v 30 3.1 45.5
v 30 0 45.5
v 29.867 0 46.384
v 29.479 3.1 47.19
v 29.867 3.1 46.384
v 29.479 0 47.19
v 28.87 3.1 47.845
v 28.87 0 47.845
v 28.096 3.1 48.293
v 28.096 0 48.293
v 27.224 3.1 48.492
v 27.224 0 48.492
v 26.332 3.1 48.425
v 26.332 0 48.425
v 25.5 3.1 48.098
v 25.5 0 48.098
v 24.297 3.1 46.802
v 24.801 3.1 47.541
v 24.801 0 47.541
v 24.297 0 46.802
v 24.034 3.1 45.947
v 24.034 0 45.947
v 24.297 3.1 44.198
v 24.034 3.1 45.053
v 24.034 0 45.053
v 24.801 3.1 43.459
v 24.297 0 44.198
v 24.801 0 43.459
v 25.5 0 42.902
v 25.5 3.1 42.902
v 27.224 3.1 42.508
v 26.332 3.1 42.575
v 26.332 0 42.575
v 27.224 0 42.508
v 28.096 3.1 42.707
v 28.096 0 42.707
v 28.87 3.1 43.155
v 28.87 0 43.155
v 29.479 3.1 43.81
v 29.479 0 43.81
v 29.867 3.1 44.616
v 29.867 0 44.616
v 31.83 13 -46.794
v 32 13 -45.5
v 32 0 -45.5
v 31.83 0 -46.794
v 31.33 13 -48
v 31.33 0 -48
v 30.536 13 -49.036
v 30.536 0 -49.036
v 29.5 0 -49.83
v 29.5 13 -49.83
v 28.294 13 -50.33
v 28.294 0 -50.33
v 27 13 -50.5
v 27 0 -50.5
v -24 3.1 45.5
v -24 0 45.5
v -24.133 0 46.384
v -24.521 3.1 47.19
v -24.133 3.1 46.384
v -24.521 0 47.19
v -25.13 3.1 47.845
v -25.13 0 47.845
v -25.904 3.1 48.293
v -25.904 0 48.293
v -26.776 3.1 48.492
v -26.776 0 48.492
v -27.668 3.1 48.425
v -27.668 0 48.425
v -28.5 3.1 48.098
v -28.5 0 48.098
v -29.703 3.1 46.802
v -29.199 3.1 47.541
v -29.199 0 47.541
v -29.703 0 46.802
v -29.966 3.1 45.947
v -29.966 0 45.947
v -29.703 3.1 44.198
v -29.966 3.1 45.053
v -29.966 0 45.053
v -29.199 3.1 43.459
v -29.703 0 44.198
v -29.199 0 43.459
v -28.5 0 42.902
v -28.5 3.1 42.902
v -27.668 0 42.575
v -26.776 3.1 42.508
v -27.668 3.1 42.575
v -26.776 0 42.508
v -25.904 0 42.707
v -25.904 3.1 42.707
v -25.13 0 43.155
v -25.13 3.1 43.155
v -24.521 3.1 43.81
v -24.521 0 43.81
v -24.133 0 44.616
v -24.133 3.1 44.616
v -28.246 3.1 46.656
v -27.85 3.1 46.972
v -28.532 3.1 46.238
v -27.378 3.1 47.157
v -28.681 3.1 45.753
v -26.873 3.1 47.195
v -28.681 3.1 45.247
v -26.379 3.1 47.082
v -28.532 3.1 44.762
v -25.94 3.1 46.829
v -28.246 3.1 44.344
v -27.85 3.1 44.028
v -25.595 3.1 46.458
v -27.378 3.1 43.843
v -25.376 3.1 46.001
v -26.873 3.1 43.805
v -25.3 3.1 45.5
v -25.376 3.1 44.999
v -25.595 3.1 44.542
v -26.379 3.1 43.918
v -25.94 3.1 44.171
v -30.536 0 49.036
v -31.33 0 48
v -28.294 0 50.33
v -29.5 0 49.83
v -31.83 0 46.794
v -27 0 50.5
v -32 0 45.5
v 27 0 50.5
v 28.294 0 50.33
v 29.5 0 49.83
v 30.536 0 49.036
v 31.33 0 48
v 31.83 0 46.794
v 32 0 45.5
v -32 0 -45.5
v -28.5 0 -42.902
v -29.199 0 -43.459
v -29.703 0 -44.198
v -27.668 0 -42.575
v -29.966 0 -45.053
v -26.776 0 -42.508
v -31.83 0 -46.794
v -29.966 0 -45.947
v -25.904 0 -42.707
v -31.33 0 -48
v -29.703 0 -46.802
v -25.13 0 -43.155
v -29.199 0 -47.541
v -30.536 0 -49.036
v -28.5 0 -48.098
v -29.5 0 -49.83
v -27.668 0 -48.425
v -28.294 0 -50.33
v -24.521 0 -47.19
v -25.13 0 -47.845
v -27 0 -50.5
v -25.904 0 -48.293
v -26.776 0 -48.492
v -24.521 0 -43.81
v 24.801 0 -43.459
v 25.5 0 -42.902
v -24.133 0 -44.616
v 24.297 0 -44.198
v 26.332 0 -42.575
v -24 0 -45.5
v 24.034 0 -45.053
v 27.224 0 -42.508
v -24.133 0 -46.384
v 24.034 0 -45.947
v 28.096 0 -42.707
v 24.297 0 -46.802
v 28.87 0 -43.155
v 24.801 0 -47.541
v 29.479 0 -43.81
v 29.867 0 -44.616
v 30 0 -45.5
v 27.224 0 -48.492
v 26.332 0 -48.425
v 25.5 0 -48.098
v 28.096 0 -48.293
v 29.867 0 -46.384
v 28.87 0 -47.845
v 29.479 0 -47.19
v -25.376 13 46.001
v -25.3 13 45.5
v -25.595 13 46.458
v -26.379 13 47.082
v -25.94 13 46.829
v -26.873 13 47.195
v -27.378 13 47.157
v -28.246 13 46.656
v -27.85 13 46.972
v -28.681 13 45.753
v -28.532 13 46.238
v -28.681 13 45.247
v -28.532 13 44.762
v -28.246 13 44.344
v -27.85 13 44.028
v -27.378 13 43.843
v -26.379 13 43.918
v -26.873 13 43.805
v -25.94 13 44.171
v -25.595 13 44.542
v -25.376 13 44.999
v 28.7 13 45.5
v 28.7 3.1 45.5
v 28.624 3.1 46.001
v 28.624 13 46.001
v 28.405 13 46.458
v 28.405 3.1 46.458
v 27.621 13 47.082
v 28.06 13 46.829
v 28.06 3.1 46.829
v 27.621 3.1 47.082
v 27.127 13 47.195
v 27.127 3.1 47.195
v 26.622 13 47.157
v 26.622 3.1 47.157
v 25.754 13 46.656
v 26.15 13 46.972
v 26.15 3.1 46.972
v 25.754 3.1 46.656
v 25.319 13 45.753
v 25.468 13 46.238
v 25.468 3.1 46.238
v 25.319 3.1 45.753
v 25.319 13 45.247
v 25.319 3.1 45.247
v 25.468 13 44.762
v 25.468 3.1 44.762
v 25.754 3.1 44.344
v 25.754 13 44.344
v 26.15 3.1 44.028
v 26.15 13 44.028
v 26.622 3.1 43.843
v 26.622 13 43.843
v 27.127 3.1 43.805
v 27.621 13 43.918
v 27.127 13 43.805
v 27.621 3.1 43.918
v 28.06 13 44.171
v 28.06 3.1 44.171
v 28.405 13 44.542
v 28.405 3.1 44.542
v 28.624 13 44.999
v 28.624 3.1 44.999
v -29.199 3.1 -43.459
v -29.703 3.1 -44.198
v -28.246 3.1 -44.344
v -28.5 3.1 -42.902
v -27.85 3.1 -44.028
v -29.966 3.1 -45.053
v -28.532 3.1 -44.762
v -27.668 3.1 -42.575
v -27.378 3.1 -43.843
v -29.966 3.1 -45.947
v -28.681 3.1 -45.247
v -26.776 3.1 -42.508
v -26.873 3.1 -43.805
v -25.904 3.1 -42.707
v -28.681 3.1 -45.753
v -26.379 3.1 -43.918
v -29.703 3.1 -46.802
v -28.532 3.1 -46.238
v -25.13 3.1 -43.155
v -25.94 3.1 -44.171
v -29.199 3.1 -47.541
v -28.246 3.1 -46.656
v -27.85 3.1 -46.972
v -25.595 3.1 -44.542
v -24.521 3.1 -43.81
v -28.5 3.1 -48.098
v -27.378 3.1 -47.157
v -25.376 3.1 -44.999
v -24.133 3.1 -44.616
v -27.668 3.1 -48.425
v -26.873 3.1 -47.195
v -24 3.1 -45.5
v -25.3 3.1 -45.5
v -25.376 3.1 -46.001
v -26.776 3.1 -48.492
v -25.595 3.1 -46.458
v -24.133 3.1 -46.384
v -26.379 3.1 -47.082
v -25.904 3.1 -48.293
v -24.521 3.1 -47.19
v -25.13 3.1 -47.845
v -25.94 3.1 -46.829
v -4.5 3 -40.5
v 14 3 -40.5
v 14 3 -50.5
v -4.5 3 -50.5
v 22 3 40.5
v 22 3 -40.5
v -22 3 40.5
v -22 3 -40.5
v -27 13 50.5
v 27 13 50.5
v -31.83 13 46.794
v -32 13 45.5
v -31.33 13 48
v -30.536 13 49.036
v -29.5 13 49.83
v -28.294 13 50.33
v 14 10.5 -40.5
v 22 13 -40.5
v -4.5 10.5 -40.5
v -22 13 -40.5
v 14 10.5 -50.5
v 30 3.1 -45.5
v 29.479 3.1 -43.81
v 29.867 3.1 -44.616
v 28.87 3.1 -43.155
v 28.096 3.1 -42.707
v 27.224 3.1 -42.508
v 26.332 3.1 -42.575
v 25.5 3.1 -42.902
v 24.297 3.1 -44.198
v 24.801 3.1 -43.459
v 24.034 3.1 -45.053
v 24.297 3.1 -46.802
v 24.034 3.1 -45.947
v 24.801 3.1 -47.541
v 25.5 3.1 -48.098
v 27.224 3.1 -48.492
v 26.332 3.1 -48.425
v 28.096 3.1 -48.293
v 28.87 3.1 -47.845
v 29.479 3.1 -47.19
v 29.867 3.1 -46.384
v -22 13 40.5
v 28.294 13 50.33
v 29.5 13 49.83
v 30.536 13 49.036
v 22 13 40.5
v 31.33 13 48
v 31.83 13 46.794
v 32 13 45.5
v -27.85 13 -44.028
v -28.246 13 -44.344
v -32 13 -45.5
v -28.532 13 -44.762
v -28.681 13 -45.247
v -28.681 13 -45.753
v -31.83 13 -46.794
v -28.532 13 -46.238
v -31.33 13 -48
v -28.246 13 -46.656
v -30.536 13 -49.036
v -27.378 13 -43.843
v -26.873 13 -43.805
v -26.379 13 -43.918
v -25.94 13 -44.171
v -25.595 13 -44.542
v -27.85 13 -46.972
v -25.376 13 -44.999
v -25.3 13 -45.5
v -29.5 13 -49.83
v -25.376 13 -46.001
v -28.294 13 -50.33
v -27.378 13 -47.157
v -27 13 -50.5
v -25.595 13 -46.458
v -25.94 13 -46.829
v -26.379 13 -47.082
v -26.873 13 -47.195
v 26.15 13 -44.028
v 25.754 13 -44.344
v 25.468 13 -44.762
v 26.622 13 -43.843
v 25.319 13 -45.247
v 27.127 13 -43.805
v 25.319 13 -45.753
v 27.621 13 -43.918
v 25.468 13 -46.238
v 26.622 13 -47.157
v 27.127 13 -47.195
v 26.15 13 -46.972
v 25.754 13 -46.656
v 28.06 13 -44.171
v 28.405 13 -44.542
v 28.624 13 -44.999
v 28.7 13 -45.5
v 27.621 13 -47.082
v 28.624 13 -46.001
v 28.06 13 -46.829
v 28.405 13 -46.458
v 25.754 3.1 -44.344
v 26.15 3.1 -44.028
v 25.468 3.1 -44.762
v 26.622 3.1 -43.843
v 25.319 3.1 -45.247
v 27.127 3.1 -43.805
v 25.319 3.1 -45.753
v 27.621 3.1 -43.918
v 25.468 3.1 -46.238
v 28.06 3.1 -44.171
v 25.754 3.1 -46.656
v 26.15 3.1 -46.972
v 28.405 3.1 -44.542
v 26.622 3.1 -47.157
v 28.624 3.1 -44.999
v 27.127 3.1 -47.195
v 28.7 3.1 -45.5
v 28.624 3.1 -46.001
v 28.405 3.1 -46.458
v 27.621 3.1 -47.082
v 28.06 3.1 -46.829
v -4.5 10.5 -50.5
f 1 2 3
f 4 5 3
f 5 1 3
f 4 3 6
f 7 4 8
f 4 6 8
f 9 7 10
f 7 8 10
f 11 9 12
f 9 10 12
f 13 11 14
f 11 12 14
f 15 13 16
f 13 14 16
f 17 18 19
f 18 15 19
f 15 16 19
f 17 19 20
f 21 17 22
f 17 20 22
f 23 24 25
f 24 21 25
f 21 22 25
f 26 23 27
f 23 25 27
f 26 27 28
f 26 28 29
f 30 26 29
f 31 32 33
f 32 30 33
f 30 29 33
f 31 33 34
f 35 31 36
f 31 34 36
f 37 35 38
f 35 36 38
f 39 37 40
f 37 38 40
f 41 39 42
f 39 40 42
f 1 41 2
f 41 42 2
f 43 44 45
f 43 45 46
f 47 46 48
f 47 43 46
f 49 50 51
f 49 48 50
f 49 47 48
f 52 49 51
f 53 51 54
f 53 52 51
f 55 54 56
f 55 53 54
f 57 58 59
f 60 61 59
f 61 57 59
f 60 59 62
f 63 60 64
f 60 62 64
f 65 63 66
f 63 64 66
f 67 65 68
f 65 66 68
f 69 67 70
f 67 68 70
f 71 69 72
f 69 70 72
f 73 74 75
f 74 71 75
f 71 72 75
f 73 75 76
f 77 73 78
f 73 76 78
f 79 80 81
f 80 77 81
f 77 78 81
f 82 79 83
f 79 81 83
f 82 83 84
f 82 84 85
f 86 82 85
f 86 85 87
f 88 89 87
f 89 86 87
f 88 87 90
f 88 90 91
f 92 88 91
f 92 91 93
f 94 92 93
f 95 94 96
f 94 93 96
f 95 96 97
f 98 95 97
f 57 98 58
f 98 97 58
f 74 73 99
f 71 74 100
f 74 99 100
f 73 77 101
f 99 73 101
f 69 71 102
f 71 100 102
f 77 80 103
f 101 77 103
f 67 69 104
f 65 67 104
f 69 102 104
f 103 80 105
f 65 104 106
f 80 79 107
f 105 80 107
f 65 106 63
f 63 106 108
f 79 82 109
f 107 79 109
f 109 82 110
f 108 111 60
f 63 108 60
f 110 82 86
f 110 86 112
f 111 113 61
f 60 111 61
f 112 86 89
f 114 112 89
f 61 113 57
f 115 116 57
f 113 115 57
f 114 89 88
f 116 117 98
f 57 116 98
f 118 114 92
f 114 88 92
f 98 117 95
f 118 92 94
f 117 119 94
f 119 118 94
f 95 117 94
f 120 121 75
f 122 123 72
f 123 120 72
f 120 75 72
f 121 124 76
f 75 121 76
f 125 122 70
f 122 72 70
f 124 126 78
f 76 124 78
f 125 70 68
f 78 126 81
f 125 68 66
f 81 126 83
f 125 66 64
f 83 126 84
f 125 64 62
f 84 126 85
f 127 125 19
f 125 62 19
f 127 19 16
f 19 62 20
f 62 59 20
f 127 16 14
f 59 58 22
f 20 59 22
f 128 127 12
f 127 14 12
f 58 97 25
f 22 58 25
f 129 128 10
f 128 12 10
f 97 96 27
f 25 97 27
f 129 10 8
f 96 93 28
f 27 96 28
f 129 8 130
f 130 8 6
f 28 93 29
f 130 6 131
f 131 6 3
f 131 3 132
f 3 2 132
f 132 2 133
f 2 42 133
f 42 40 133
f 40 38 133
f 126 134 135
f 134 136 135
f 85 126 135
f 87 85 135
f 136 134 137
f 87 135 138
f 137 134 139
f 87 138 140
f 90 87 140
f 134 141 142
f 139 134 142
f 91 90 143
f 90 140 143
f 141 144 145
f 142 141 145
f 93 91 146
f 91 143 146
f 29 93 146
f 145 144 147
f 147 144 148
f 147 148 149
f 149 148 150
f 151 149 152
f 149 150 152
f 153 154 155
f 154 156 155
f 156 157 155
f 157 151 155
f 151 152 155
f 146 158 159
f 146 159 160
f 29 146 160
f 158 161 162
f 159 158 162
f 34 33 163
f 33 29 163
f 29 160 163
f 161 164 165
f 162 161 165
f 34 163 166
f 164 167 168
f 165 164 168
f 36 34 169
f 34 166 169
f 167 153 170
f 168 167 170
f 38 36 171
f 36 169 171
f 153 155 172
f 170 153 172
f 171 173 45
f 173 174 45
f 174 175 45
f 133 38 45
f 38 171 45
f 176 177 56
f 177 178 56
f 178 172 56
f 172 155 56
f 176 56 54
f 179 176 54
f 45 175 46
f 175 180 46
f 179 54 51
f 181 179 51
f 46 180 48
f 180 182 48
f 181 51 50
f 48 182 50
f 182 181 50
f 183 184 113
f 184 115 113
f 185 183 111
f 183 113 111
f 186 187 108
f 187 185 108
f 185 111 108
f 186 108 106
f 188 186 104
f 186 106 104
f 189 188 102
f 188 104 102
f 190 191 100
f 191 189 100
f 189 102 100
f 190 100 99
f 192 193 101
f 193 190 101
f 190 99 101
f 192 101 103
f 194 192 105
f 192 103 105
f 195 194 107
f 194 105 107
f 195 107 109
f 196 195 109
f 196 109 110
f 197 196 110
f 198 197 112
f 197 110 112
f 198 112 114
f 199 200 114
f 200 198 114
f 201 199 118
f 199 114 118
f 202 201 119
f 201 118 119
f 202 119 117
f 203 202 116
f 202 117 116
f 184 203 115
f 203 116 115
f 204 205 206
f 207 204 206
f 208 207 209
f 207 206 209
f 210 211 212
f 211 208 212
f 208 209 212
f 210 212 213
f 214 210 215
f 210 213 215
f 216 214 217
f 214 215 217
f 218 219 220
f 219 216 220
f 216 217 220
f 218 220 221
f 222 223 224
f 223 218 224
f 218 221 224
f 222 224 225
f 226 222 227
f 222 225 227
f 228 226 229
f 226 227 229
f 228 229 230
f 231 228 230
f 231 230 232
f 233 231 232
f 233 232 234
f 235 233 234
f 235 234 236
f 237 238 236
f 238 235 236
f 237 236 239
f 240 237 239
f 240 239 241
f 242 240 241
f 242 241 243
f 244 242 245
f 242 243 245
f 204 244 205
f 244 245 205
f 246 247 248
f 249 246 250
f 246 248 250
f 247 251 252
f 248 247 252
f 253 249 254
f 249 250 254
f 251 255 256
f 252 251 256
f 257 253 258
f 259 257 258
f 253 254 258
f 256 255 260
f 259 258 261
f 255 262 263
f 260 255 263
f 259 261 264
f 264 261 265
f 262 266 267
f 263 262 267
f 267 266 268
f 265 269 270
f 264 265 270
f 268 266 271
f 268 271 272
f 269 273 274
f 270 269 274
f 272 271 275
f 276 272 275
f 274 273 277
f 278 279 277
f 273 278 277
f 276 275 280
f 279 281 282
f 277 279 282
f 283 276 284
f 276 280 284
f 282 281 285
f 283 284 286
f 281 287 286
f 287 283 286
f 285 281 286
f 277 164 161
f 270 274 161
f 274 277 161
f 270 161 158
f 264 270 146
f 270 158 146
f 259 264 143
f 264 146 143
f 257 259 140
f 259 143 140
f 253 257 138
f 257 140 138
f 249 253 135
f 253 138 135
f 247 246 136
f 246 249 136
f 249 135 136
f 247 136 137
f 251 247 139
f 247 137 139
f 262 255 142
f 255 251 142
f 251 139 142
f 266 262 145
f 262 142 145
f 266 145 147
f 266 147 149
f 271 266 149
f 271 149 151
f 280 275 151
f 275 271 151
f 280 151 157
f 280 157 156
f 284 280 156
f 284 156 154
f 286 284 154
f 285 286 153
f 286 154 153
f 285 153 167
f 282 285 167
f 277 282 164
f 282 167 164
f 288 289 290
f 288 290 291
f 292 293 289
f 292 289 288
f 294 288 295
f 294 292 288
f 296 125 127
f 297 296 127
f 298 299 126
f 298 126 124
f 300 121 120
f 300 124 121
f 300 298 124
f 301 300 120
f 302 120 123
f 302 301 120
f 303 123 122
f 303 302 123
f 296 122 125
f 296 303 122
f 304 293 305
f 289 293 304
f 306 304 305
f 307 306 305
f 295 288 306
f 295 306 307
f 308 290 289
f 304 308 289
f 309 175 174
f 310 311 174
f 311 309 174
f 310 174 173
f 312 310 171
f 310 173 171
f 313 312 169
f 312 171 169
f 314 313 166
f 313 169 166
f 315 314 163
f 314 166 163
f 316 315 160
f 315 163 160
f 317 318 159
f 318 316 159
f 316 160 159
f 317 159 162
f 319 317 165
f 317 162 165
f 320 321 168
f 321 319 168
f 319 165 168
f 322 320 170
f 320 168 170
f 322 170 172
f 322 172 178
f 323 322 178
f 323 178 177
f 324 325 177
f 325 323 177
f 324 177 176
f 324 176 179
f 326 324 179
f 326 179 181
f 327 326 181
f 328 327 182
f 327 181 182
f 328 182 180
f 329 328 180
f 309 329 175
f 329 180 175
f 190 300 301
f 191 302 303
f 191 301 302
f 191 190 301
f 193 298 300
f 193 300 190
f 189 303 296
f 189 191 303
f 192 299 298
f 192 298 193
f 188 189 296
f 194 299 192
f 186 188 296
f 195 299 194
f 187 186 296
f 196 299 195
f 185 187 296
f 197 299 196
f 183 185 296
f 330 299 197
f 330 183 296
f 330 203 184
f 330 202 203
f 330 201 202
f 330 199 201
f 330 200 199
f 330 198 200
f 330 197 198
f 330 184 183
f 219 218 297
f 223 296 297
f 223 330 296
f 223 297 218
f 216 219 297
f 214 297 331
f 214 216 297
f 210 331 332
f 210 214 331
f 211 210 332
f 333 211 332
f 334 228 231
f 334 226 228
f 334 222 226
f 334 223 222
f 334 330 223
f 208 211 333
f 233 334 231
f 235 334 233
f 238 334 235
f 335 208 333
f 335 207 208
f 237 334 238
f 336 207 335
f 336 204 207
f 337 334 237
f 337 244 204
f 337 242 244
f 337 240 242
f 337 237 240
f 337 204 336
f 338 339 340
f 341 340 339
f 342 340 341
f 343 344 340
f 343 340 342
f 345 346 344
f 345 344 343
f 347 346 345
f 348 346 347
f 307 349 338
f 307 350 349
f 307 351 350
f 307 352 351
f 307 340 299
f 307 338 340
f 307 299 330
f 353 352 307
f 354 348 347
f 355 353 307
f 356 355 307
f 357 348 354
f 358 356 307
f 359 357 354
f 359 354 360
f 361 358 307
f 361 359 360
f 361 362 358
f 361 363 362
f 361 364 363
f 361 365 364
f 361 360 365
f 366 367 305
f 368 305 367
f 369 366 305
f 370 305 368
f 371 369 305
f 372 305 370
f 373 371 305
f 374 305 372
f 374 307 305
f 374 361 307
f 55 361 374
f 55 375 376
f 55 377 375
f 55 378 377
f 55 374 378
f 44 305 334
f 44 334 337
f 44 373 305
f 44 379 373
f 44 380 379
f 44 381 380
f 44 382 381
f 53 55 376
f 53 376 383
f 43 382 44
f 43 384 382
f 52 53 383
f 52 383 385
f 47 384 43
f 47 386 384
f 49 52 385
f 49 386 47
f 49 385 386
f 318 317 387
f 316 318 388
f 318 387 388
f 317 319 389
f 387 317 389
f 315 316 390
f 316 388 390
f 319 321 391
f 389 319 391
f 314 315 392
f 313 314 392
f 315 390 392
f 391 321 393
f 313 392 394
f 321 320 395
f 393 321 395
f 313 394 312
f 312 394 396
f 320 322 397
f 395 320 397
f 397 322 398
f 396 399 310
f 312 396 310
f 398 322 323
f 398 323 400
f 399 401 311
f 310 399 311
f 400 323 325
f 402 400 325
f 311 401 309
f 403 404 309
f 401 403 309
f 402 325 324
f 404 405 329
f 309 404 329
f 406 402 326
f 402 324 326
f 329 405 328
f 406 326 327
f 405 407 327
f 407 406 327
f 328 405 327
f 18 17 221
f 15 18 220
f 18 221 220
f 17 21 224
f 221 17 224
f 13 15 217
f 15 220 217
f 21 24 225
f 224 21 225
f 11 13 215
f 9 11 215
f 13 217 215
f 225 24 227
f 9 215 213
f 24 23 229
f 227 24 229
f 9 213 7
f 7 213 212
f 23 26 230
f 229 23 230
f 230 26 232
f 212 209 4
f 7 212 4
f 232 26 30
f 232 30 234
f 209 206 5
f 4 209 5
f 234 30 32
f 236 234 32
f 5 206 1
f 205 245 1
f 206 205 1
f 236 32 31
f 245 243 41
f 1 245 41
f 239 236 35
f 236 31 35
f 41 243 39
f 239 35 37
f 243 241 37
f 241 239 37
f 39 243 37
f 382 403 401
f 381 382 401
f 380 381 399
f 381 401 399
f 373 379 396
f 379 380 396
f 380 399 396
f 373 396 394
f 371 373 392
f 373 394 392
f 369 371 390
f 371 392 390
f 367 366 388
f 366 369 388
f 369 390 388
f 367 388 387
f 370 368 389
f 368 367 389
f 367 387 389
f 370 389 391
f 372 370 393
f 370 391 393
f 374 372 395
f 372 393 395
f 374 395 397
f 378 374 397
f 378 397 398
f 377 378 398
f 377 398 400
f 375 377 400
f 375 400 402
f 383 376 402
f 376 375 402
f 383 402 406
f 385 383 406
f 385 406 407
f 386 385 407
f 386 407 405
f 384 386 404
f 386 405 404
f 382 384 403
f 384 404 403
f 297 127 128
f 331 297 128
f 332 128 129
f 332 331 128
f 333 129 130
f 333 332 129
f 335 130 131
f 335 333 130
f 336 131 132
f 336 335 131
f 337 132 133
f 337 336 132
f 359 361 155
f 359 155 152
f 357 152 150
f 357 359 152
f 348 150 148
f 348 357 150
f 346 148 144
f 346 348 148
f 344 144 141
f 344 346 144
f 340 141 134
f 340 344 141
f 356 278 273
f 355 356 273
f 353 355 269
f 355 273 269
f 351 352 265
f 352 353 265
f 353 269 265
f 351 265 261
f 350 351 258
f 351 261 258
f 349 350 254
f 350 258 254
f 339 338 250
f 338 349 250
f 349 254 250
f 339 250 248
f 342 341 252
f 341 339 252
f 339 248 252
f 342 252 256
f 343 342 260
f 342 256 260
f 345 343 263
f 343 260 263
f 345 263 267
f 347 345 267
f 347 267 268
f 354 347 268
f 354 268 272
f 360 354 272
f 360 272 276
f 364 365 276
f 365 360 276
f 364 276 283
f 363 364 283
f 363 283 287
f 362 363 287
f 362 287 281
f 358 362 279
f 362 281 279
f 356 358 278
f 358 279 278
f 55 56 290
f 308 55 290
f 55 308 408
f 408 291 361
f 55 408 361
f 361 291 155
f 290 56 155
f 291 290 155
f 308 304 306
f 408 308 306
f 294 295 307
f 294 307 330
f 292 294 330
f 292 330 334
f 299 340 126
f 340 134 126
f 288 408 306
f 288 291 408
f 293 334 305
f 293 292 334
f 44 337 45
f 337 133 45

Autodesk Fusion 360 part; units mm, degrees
sketch "Sketch1" plane through (0, 0, 0) normal (0, 1, 0) x (1, 0, 0)
  line L0 (22, 40.5) -> (-22, 40.5)
  line L1 (-22, 40.5) -> (-22, -40.5)
  line L2 (-22, -40.5) -> (22, -40.5)
  line L3 (22, -40.5) -> (22, 40.5)
  line L4 (22, 40.5) -> (-22, -40.5) construction
  line L5 (-22, 40.5) -> (22, -40.5) construction
  line L6 (32, 50.5) -> (-32, 50.5)
  line L7 (-32, 50.5) -> (-32, -50.5)
  line L8 (-32, -50.5) -> (32, -50.5)
  line L9 (32, -50.5) -> (32, 50.5)
  line L10 (32, 50.5) -> (-32, -50.5) construction
  line L11 (-32, 50.5) -> (32, -50.5) construction
  line L12 (-32, 50.5) -> (-27, 50.5)
  line L13 (-32, 45.5) -> (-32, 50.5)
  circle A0 centre (-27, 45.5) radius 1.7
  circle A1 centre (-27, 45.5) radius 3
  line L14 (32, 50.5) -> (27, 50.5)
  line L15 (32, 45.5) -> (32, 50.5)
  circle A2 centre (27, 45.5) radius 1.7
  circle A3 centre (27, 45.5) radius 3
  line L16 (32, -50.5) -> (27, -50.5)
  line L17 (32, -45.5) -> (32, -50.5)
  circle A4 centre (27, -45.5) radius 1.7
  circle A5 centre (27, -45.5) radius 3
  line L18 (-32, -50.5) -> (-27, -50.5)
  line L19 (-32, -45.5) -> (-32, -50.5)
  circle A6 centre (-27, -45.5) radius 1.7
  circle A7 centre (-27, -45.5) radius 3
  dimension "d1" = 44
  dimension "d2" = 81
  dimension "d3" = 64
  dimension "d4" = 101
  dimension "d5" = 5
  dimension "d6" = 5
  dimension "d7" = 3.4
  dimension "d8" = 6
  dimension "d9" = 5
  dimension "d10" = 5
  dimension "d11" = 3.4
  dimension "d12" = 6
  dimension "d13" = 5
  dimension "d14" = 5
  dimension "d15" = 3.4
  dimension "d16" = 6
  dimension "d17" = 5
  dimension "d18" = 5
  dimension "d19" = 3.4
  dimension "d20" = 6
extrude "Extrude1" add sketch "Sketch1" along normal blind 9.9 from surface at 3.1 contours A1 | A3 | A5 | A7 makes body 1 at (29.9963, 9.7, 45.6495) makes body 2 at (-29.9963, 9.7, 45.6495) makes body 3 at (29.9963, 9.7, -45.3505) makes body 4 at (-29.9963, 9.7, -45.3505)
extrude "Extrude2" add sketch "Sketch1" along normal blind 13 contours L6 L7 L8 L9 L12 L13 L14 L15 L16 L17 L18 L19 bodies 1 2 3 4
extrude "Extrude3" add sketch "Sketch1" along normal blind 3 contours L0 L1 L2 L3 bodies 1
sketch "Sketch2" plane through (0, 3, 0) normal (0, 1, 0) x (-1, 0, 0)
  line L0 (-22, 40.5) -> (-22, -40.5)
  line L1 (-22, -40.5) -> (22, -40.5)
  line L2 (22, -40.5) -> (22, 40.5)
  line L3 (22, 40.5) -> (-22, 40.5)
  line L4 (-22, -40.5) -> (-32, -40.5)
  line L5 (-32, -40.5) -> (-32, -50.5)
  line L6 (-32, -50.5) -> (-22, -50.5)
  line L7 (-22, -50.5) -> (-22, -40.5)
  line L8 (-22, -50.5) -> (-14, -50.5)
  line L9 (-14, -50.5) -> (-14, -40.5)
  line L10 (-14, -40.5) -> (-22, -40.5)
  line L11 (-22, -40.5) -> (-22, -50.5)
  line L12 (-14, -50.5) -> (4.5, -50.5)
  line L13 (4.5, -50.5) -> (4.5, -40.5)
  line L14 (4.5, -40.5) -> (-14, -40.5)
  line L15 (-14, -40.5) -> (-14, -50.5)
  dimension "d28" = 10
  dimension "d29" = 10
  dimension "d30" = 8
  dimension "d31" = 10
  dimension "d32" = 18.5
  dimension "d33" = 10
extrude "Extrude4" cut sketch "Sketch2" along normal blind 7.5 contours L1 L9 L12 L13 L14 L15 bodies 1
fillet "Fillet1" radius 5 1 edges at (-32, 6.5, -50.5) on bodies 1
fillet "Fillet2" radius 5 1 edges at (32, 6.5, -50.5) on bodies 1
fillet "Fillet3" radius 5 1 edges at (32, 6.5, 50.5) on bodies 1
fillet "Fillet4" radius 5 1 edges at (-32, 6.5, 50.5) on bodies 1
sketch "Sketch3" plane through (0, 3, 0) normal (0, 1, 0) x (-1, 0, 0)
  line L0 (-22, 40.5) -> (-22, -40.5)
  line L1 (-22, -40.5) -> (-14, -40.5)
  line L2 (-14, -40.5) -> (-14, -50.5)
  line L3 (-14, -50.5) -> (4.5, -50.5)
  line L4 (4.5, -50.5) -> (4.5, -40.5)
  line L5 (4.5, -40.5) -> (22, -40.5)
  line L6 (22, -40.5) -> (22, 40.5)
  line L7 (22, 40.5) -> (-22, 40.5)
